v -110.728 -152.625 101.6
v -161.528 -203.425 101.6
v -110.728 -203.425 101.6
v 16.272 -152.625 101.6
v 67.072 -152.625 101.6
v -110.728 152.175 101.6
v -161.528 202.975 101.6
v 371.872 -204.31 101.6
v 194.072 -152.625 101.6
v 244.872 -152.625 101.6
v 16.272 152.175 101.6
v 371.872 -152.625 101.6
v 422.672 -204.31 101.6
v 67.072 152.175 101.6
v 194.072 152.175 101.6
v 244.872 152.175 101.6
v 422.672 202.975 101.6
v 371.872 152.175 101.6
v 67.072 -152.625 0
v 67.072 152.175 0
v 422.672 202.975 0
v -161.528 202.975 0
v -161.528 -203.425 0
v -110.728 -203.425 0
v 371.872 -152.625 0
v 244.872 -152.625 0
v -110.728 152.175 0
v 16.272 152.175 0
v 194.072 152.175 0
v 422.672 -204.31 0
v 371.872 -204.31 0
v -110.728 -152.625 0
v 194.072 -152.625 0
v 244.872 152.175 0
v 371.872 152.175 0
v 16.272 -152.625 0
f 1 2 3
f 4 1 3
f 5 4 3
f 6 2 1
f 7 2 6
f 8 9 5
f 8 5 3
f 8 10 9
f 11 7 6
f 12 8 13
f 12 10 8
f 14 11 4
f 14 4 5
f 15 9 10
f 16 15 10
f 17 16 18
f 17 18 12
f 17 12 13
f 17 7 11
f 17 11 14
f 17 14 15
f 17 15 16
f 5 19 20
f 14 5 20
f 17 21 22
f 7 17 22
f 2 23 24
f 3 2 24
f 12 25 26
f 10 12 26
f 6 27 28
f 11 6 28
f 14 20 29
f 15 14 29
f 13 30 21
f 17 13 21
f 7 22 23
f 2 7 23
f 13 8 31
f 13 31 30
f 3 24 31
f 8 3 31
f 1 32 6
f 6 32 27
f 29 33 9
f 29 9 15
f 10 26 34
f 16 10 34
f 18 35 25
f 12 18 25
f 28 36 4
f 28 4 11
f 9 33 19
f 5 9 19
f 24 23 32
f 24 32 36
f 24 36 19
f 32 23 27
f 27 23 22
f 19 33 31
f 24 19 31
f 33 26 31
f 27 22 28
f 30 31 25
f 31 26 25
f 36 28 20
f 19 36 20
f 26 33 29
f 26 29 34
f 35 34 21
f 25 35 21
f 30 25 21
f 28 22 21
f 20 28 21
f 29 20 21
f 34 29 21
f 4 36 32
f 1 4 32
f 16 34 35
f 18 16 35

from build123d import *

# Parameters (mm, degrees)
F0_W     = 50.8
F0_H     = 304.8
F1_DEPTH = 101.6


# Not quite as in the source:
# - a feature names something its author has since deleted; it is built from what else it names


with BuildPart() as f1:
    # F0 (on Top) → F1 (new body)
    with BuildSketch(Plane.XY):
        Polygon((422.6718741447, 202.9749498913), (371.8718741447, 202.9749498913), (371.8718741447, 152.1749498913), (371.8718741447, -152.6250501087), (371.8718741447, -204.3104916811), (422.6718741447, -204.3104916811), align=None)
        Polygon((-110.7281258553, -152.6250501087), (-110.7281258553, 152.1749498913), (-110.7281258553, 202.9749498913), (-161.5281258553, 202.9749498913), (-161.5281258553, -152.6250501087), (-161.5281258553, -203.4250501087), (-110.7281258553, -203.4250501087), align=None)
        Polygon((-110.7281258553, 202.9749498913), (-110.7281258553, 152.1749498913), (16.2718741447, 152.1749498913), (67.0718741447, 152.1749498913), (194.0718741447, 152.1749498913), (244.8718741447, 152.1749498913), (371.8718741447, 152.1749498913), (371.8718741447, 202.9749498913), align=None)
        with Locations((41.6718741447, -0.2250501087)):
            Rectangle(F0_W, F0_H)
        with Locations((219.4718741447, -0.2250501087)):
            Rectangle(F0_W, F0_H)
        Polygon((16.2718741447, -152.6250501087), (-110.7281258553, -152.6250501087), (-110.7281258553, -203.4250501087), (371.8718741447, -204.3104916811), (371.8718741447, -152.6250501087), (244.8718741447, -152.6250501087), (194.0718741447, -152.6250501087), (67.0718741447, -152.6250501087), align=None)
    extrude(amount=F1_DEPTH)


solid = f1.part
